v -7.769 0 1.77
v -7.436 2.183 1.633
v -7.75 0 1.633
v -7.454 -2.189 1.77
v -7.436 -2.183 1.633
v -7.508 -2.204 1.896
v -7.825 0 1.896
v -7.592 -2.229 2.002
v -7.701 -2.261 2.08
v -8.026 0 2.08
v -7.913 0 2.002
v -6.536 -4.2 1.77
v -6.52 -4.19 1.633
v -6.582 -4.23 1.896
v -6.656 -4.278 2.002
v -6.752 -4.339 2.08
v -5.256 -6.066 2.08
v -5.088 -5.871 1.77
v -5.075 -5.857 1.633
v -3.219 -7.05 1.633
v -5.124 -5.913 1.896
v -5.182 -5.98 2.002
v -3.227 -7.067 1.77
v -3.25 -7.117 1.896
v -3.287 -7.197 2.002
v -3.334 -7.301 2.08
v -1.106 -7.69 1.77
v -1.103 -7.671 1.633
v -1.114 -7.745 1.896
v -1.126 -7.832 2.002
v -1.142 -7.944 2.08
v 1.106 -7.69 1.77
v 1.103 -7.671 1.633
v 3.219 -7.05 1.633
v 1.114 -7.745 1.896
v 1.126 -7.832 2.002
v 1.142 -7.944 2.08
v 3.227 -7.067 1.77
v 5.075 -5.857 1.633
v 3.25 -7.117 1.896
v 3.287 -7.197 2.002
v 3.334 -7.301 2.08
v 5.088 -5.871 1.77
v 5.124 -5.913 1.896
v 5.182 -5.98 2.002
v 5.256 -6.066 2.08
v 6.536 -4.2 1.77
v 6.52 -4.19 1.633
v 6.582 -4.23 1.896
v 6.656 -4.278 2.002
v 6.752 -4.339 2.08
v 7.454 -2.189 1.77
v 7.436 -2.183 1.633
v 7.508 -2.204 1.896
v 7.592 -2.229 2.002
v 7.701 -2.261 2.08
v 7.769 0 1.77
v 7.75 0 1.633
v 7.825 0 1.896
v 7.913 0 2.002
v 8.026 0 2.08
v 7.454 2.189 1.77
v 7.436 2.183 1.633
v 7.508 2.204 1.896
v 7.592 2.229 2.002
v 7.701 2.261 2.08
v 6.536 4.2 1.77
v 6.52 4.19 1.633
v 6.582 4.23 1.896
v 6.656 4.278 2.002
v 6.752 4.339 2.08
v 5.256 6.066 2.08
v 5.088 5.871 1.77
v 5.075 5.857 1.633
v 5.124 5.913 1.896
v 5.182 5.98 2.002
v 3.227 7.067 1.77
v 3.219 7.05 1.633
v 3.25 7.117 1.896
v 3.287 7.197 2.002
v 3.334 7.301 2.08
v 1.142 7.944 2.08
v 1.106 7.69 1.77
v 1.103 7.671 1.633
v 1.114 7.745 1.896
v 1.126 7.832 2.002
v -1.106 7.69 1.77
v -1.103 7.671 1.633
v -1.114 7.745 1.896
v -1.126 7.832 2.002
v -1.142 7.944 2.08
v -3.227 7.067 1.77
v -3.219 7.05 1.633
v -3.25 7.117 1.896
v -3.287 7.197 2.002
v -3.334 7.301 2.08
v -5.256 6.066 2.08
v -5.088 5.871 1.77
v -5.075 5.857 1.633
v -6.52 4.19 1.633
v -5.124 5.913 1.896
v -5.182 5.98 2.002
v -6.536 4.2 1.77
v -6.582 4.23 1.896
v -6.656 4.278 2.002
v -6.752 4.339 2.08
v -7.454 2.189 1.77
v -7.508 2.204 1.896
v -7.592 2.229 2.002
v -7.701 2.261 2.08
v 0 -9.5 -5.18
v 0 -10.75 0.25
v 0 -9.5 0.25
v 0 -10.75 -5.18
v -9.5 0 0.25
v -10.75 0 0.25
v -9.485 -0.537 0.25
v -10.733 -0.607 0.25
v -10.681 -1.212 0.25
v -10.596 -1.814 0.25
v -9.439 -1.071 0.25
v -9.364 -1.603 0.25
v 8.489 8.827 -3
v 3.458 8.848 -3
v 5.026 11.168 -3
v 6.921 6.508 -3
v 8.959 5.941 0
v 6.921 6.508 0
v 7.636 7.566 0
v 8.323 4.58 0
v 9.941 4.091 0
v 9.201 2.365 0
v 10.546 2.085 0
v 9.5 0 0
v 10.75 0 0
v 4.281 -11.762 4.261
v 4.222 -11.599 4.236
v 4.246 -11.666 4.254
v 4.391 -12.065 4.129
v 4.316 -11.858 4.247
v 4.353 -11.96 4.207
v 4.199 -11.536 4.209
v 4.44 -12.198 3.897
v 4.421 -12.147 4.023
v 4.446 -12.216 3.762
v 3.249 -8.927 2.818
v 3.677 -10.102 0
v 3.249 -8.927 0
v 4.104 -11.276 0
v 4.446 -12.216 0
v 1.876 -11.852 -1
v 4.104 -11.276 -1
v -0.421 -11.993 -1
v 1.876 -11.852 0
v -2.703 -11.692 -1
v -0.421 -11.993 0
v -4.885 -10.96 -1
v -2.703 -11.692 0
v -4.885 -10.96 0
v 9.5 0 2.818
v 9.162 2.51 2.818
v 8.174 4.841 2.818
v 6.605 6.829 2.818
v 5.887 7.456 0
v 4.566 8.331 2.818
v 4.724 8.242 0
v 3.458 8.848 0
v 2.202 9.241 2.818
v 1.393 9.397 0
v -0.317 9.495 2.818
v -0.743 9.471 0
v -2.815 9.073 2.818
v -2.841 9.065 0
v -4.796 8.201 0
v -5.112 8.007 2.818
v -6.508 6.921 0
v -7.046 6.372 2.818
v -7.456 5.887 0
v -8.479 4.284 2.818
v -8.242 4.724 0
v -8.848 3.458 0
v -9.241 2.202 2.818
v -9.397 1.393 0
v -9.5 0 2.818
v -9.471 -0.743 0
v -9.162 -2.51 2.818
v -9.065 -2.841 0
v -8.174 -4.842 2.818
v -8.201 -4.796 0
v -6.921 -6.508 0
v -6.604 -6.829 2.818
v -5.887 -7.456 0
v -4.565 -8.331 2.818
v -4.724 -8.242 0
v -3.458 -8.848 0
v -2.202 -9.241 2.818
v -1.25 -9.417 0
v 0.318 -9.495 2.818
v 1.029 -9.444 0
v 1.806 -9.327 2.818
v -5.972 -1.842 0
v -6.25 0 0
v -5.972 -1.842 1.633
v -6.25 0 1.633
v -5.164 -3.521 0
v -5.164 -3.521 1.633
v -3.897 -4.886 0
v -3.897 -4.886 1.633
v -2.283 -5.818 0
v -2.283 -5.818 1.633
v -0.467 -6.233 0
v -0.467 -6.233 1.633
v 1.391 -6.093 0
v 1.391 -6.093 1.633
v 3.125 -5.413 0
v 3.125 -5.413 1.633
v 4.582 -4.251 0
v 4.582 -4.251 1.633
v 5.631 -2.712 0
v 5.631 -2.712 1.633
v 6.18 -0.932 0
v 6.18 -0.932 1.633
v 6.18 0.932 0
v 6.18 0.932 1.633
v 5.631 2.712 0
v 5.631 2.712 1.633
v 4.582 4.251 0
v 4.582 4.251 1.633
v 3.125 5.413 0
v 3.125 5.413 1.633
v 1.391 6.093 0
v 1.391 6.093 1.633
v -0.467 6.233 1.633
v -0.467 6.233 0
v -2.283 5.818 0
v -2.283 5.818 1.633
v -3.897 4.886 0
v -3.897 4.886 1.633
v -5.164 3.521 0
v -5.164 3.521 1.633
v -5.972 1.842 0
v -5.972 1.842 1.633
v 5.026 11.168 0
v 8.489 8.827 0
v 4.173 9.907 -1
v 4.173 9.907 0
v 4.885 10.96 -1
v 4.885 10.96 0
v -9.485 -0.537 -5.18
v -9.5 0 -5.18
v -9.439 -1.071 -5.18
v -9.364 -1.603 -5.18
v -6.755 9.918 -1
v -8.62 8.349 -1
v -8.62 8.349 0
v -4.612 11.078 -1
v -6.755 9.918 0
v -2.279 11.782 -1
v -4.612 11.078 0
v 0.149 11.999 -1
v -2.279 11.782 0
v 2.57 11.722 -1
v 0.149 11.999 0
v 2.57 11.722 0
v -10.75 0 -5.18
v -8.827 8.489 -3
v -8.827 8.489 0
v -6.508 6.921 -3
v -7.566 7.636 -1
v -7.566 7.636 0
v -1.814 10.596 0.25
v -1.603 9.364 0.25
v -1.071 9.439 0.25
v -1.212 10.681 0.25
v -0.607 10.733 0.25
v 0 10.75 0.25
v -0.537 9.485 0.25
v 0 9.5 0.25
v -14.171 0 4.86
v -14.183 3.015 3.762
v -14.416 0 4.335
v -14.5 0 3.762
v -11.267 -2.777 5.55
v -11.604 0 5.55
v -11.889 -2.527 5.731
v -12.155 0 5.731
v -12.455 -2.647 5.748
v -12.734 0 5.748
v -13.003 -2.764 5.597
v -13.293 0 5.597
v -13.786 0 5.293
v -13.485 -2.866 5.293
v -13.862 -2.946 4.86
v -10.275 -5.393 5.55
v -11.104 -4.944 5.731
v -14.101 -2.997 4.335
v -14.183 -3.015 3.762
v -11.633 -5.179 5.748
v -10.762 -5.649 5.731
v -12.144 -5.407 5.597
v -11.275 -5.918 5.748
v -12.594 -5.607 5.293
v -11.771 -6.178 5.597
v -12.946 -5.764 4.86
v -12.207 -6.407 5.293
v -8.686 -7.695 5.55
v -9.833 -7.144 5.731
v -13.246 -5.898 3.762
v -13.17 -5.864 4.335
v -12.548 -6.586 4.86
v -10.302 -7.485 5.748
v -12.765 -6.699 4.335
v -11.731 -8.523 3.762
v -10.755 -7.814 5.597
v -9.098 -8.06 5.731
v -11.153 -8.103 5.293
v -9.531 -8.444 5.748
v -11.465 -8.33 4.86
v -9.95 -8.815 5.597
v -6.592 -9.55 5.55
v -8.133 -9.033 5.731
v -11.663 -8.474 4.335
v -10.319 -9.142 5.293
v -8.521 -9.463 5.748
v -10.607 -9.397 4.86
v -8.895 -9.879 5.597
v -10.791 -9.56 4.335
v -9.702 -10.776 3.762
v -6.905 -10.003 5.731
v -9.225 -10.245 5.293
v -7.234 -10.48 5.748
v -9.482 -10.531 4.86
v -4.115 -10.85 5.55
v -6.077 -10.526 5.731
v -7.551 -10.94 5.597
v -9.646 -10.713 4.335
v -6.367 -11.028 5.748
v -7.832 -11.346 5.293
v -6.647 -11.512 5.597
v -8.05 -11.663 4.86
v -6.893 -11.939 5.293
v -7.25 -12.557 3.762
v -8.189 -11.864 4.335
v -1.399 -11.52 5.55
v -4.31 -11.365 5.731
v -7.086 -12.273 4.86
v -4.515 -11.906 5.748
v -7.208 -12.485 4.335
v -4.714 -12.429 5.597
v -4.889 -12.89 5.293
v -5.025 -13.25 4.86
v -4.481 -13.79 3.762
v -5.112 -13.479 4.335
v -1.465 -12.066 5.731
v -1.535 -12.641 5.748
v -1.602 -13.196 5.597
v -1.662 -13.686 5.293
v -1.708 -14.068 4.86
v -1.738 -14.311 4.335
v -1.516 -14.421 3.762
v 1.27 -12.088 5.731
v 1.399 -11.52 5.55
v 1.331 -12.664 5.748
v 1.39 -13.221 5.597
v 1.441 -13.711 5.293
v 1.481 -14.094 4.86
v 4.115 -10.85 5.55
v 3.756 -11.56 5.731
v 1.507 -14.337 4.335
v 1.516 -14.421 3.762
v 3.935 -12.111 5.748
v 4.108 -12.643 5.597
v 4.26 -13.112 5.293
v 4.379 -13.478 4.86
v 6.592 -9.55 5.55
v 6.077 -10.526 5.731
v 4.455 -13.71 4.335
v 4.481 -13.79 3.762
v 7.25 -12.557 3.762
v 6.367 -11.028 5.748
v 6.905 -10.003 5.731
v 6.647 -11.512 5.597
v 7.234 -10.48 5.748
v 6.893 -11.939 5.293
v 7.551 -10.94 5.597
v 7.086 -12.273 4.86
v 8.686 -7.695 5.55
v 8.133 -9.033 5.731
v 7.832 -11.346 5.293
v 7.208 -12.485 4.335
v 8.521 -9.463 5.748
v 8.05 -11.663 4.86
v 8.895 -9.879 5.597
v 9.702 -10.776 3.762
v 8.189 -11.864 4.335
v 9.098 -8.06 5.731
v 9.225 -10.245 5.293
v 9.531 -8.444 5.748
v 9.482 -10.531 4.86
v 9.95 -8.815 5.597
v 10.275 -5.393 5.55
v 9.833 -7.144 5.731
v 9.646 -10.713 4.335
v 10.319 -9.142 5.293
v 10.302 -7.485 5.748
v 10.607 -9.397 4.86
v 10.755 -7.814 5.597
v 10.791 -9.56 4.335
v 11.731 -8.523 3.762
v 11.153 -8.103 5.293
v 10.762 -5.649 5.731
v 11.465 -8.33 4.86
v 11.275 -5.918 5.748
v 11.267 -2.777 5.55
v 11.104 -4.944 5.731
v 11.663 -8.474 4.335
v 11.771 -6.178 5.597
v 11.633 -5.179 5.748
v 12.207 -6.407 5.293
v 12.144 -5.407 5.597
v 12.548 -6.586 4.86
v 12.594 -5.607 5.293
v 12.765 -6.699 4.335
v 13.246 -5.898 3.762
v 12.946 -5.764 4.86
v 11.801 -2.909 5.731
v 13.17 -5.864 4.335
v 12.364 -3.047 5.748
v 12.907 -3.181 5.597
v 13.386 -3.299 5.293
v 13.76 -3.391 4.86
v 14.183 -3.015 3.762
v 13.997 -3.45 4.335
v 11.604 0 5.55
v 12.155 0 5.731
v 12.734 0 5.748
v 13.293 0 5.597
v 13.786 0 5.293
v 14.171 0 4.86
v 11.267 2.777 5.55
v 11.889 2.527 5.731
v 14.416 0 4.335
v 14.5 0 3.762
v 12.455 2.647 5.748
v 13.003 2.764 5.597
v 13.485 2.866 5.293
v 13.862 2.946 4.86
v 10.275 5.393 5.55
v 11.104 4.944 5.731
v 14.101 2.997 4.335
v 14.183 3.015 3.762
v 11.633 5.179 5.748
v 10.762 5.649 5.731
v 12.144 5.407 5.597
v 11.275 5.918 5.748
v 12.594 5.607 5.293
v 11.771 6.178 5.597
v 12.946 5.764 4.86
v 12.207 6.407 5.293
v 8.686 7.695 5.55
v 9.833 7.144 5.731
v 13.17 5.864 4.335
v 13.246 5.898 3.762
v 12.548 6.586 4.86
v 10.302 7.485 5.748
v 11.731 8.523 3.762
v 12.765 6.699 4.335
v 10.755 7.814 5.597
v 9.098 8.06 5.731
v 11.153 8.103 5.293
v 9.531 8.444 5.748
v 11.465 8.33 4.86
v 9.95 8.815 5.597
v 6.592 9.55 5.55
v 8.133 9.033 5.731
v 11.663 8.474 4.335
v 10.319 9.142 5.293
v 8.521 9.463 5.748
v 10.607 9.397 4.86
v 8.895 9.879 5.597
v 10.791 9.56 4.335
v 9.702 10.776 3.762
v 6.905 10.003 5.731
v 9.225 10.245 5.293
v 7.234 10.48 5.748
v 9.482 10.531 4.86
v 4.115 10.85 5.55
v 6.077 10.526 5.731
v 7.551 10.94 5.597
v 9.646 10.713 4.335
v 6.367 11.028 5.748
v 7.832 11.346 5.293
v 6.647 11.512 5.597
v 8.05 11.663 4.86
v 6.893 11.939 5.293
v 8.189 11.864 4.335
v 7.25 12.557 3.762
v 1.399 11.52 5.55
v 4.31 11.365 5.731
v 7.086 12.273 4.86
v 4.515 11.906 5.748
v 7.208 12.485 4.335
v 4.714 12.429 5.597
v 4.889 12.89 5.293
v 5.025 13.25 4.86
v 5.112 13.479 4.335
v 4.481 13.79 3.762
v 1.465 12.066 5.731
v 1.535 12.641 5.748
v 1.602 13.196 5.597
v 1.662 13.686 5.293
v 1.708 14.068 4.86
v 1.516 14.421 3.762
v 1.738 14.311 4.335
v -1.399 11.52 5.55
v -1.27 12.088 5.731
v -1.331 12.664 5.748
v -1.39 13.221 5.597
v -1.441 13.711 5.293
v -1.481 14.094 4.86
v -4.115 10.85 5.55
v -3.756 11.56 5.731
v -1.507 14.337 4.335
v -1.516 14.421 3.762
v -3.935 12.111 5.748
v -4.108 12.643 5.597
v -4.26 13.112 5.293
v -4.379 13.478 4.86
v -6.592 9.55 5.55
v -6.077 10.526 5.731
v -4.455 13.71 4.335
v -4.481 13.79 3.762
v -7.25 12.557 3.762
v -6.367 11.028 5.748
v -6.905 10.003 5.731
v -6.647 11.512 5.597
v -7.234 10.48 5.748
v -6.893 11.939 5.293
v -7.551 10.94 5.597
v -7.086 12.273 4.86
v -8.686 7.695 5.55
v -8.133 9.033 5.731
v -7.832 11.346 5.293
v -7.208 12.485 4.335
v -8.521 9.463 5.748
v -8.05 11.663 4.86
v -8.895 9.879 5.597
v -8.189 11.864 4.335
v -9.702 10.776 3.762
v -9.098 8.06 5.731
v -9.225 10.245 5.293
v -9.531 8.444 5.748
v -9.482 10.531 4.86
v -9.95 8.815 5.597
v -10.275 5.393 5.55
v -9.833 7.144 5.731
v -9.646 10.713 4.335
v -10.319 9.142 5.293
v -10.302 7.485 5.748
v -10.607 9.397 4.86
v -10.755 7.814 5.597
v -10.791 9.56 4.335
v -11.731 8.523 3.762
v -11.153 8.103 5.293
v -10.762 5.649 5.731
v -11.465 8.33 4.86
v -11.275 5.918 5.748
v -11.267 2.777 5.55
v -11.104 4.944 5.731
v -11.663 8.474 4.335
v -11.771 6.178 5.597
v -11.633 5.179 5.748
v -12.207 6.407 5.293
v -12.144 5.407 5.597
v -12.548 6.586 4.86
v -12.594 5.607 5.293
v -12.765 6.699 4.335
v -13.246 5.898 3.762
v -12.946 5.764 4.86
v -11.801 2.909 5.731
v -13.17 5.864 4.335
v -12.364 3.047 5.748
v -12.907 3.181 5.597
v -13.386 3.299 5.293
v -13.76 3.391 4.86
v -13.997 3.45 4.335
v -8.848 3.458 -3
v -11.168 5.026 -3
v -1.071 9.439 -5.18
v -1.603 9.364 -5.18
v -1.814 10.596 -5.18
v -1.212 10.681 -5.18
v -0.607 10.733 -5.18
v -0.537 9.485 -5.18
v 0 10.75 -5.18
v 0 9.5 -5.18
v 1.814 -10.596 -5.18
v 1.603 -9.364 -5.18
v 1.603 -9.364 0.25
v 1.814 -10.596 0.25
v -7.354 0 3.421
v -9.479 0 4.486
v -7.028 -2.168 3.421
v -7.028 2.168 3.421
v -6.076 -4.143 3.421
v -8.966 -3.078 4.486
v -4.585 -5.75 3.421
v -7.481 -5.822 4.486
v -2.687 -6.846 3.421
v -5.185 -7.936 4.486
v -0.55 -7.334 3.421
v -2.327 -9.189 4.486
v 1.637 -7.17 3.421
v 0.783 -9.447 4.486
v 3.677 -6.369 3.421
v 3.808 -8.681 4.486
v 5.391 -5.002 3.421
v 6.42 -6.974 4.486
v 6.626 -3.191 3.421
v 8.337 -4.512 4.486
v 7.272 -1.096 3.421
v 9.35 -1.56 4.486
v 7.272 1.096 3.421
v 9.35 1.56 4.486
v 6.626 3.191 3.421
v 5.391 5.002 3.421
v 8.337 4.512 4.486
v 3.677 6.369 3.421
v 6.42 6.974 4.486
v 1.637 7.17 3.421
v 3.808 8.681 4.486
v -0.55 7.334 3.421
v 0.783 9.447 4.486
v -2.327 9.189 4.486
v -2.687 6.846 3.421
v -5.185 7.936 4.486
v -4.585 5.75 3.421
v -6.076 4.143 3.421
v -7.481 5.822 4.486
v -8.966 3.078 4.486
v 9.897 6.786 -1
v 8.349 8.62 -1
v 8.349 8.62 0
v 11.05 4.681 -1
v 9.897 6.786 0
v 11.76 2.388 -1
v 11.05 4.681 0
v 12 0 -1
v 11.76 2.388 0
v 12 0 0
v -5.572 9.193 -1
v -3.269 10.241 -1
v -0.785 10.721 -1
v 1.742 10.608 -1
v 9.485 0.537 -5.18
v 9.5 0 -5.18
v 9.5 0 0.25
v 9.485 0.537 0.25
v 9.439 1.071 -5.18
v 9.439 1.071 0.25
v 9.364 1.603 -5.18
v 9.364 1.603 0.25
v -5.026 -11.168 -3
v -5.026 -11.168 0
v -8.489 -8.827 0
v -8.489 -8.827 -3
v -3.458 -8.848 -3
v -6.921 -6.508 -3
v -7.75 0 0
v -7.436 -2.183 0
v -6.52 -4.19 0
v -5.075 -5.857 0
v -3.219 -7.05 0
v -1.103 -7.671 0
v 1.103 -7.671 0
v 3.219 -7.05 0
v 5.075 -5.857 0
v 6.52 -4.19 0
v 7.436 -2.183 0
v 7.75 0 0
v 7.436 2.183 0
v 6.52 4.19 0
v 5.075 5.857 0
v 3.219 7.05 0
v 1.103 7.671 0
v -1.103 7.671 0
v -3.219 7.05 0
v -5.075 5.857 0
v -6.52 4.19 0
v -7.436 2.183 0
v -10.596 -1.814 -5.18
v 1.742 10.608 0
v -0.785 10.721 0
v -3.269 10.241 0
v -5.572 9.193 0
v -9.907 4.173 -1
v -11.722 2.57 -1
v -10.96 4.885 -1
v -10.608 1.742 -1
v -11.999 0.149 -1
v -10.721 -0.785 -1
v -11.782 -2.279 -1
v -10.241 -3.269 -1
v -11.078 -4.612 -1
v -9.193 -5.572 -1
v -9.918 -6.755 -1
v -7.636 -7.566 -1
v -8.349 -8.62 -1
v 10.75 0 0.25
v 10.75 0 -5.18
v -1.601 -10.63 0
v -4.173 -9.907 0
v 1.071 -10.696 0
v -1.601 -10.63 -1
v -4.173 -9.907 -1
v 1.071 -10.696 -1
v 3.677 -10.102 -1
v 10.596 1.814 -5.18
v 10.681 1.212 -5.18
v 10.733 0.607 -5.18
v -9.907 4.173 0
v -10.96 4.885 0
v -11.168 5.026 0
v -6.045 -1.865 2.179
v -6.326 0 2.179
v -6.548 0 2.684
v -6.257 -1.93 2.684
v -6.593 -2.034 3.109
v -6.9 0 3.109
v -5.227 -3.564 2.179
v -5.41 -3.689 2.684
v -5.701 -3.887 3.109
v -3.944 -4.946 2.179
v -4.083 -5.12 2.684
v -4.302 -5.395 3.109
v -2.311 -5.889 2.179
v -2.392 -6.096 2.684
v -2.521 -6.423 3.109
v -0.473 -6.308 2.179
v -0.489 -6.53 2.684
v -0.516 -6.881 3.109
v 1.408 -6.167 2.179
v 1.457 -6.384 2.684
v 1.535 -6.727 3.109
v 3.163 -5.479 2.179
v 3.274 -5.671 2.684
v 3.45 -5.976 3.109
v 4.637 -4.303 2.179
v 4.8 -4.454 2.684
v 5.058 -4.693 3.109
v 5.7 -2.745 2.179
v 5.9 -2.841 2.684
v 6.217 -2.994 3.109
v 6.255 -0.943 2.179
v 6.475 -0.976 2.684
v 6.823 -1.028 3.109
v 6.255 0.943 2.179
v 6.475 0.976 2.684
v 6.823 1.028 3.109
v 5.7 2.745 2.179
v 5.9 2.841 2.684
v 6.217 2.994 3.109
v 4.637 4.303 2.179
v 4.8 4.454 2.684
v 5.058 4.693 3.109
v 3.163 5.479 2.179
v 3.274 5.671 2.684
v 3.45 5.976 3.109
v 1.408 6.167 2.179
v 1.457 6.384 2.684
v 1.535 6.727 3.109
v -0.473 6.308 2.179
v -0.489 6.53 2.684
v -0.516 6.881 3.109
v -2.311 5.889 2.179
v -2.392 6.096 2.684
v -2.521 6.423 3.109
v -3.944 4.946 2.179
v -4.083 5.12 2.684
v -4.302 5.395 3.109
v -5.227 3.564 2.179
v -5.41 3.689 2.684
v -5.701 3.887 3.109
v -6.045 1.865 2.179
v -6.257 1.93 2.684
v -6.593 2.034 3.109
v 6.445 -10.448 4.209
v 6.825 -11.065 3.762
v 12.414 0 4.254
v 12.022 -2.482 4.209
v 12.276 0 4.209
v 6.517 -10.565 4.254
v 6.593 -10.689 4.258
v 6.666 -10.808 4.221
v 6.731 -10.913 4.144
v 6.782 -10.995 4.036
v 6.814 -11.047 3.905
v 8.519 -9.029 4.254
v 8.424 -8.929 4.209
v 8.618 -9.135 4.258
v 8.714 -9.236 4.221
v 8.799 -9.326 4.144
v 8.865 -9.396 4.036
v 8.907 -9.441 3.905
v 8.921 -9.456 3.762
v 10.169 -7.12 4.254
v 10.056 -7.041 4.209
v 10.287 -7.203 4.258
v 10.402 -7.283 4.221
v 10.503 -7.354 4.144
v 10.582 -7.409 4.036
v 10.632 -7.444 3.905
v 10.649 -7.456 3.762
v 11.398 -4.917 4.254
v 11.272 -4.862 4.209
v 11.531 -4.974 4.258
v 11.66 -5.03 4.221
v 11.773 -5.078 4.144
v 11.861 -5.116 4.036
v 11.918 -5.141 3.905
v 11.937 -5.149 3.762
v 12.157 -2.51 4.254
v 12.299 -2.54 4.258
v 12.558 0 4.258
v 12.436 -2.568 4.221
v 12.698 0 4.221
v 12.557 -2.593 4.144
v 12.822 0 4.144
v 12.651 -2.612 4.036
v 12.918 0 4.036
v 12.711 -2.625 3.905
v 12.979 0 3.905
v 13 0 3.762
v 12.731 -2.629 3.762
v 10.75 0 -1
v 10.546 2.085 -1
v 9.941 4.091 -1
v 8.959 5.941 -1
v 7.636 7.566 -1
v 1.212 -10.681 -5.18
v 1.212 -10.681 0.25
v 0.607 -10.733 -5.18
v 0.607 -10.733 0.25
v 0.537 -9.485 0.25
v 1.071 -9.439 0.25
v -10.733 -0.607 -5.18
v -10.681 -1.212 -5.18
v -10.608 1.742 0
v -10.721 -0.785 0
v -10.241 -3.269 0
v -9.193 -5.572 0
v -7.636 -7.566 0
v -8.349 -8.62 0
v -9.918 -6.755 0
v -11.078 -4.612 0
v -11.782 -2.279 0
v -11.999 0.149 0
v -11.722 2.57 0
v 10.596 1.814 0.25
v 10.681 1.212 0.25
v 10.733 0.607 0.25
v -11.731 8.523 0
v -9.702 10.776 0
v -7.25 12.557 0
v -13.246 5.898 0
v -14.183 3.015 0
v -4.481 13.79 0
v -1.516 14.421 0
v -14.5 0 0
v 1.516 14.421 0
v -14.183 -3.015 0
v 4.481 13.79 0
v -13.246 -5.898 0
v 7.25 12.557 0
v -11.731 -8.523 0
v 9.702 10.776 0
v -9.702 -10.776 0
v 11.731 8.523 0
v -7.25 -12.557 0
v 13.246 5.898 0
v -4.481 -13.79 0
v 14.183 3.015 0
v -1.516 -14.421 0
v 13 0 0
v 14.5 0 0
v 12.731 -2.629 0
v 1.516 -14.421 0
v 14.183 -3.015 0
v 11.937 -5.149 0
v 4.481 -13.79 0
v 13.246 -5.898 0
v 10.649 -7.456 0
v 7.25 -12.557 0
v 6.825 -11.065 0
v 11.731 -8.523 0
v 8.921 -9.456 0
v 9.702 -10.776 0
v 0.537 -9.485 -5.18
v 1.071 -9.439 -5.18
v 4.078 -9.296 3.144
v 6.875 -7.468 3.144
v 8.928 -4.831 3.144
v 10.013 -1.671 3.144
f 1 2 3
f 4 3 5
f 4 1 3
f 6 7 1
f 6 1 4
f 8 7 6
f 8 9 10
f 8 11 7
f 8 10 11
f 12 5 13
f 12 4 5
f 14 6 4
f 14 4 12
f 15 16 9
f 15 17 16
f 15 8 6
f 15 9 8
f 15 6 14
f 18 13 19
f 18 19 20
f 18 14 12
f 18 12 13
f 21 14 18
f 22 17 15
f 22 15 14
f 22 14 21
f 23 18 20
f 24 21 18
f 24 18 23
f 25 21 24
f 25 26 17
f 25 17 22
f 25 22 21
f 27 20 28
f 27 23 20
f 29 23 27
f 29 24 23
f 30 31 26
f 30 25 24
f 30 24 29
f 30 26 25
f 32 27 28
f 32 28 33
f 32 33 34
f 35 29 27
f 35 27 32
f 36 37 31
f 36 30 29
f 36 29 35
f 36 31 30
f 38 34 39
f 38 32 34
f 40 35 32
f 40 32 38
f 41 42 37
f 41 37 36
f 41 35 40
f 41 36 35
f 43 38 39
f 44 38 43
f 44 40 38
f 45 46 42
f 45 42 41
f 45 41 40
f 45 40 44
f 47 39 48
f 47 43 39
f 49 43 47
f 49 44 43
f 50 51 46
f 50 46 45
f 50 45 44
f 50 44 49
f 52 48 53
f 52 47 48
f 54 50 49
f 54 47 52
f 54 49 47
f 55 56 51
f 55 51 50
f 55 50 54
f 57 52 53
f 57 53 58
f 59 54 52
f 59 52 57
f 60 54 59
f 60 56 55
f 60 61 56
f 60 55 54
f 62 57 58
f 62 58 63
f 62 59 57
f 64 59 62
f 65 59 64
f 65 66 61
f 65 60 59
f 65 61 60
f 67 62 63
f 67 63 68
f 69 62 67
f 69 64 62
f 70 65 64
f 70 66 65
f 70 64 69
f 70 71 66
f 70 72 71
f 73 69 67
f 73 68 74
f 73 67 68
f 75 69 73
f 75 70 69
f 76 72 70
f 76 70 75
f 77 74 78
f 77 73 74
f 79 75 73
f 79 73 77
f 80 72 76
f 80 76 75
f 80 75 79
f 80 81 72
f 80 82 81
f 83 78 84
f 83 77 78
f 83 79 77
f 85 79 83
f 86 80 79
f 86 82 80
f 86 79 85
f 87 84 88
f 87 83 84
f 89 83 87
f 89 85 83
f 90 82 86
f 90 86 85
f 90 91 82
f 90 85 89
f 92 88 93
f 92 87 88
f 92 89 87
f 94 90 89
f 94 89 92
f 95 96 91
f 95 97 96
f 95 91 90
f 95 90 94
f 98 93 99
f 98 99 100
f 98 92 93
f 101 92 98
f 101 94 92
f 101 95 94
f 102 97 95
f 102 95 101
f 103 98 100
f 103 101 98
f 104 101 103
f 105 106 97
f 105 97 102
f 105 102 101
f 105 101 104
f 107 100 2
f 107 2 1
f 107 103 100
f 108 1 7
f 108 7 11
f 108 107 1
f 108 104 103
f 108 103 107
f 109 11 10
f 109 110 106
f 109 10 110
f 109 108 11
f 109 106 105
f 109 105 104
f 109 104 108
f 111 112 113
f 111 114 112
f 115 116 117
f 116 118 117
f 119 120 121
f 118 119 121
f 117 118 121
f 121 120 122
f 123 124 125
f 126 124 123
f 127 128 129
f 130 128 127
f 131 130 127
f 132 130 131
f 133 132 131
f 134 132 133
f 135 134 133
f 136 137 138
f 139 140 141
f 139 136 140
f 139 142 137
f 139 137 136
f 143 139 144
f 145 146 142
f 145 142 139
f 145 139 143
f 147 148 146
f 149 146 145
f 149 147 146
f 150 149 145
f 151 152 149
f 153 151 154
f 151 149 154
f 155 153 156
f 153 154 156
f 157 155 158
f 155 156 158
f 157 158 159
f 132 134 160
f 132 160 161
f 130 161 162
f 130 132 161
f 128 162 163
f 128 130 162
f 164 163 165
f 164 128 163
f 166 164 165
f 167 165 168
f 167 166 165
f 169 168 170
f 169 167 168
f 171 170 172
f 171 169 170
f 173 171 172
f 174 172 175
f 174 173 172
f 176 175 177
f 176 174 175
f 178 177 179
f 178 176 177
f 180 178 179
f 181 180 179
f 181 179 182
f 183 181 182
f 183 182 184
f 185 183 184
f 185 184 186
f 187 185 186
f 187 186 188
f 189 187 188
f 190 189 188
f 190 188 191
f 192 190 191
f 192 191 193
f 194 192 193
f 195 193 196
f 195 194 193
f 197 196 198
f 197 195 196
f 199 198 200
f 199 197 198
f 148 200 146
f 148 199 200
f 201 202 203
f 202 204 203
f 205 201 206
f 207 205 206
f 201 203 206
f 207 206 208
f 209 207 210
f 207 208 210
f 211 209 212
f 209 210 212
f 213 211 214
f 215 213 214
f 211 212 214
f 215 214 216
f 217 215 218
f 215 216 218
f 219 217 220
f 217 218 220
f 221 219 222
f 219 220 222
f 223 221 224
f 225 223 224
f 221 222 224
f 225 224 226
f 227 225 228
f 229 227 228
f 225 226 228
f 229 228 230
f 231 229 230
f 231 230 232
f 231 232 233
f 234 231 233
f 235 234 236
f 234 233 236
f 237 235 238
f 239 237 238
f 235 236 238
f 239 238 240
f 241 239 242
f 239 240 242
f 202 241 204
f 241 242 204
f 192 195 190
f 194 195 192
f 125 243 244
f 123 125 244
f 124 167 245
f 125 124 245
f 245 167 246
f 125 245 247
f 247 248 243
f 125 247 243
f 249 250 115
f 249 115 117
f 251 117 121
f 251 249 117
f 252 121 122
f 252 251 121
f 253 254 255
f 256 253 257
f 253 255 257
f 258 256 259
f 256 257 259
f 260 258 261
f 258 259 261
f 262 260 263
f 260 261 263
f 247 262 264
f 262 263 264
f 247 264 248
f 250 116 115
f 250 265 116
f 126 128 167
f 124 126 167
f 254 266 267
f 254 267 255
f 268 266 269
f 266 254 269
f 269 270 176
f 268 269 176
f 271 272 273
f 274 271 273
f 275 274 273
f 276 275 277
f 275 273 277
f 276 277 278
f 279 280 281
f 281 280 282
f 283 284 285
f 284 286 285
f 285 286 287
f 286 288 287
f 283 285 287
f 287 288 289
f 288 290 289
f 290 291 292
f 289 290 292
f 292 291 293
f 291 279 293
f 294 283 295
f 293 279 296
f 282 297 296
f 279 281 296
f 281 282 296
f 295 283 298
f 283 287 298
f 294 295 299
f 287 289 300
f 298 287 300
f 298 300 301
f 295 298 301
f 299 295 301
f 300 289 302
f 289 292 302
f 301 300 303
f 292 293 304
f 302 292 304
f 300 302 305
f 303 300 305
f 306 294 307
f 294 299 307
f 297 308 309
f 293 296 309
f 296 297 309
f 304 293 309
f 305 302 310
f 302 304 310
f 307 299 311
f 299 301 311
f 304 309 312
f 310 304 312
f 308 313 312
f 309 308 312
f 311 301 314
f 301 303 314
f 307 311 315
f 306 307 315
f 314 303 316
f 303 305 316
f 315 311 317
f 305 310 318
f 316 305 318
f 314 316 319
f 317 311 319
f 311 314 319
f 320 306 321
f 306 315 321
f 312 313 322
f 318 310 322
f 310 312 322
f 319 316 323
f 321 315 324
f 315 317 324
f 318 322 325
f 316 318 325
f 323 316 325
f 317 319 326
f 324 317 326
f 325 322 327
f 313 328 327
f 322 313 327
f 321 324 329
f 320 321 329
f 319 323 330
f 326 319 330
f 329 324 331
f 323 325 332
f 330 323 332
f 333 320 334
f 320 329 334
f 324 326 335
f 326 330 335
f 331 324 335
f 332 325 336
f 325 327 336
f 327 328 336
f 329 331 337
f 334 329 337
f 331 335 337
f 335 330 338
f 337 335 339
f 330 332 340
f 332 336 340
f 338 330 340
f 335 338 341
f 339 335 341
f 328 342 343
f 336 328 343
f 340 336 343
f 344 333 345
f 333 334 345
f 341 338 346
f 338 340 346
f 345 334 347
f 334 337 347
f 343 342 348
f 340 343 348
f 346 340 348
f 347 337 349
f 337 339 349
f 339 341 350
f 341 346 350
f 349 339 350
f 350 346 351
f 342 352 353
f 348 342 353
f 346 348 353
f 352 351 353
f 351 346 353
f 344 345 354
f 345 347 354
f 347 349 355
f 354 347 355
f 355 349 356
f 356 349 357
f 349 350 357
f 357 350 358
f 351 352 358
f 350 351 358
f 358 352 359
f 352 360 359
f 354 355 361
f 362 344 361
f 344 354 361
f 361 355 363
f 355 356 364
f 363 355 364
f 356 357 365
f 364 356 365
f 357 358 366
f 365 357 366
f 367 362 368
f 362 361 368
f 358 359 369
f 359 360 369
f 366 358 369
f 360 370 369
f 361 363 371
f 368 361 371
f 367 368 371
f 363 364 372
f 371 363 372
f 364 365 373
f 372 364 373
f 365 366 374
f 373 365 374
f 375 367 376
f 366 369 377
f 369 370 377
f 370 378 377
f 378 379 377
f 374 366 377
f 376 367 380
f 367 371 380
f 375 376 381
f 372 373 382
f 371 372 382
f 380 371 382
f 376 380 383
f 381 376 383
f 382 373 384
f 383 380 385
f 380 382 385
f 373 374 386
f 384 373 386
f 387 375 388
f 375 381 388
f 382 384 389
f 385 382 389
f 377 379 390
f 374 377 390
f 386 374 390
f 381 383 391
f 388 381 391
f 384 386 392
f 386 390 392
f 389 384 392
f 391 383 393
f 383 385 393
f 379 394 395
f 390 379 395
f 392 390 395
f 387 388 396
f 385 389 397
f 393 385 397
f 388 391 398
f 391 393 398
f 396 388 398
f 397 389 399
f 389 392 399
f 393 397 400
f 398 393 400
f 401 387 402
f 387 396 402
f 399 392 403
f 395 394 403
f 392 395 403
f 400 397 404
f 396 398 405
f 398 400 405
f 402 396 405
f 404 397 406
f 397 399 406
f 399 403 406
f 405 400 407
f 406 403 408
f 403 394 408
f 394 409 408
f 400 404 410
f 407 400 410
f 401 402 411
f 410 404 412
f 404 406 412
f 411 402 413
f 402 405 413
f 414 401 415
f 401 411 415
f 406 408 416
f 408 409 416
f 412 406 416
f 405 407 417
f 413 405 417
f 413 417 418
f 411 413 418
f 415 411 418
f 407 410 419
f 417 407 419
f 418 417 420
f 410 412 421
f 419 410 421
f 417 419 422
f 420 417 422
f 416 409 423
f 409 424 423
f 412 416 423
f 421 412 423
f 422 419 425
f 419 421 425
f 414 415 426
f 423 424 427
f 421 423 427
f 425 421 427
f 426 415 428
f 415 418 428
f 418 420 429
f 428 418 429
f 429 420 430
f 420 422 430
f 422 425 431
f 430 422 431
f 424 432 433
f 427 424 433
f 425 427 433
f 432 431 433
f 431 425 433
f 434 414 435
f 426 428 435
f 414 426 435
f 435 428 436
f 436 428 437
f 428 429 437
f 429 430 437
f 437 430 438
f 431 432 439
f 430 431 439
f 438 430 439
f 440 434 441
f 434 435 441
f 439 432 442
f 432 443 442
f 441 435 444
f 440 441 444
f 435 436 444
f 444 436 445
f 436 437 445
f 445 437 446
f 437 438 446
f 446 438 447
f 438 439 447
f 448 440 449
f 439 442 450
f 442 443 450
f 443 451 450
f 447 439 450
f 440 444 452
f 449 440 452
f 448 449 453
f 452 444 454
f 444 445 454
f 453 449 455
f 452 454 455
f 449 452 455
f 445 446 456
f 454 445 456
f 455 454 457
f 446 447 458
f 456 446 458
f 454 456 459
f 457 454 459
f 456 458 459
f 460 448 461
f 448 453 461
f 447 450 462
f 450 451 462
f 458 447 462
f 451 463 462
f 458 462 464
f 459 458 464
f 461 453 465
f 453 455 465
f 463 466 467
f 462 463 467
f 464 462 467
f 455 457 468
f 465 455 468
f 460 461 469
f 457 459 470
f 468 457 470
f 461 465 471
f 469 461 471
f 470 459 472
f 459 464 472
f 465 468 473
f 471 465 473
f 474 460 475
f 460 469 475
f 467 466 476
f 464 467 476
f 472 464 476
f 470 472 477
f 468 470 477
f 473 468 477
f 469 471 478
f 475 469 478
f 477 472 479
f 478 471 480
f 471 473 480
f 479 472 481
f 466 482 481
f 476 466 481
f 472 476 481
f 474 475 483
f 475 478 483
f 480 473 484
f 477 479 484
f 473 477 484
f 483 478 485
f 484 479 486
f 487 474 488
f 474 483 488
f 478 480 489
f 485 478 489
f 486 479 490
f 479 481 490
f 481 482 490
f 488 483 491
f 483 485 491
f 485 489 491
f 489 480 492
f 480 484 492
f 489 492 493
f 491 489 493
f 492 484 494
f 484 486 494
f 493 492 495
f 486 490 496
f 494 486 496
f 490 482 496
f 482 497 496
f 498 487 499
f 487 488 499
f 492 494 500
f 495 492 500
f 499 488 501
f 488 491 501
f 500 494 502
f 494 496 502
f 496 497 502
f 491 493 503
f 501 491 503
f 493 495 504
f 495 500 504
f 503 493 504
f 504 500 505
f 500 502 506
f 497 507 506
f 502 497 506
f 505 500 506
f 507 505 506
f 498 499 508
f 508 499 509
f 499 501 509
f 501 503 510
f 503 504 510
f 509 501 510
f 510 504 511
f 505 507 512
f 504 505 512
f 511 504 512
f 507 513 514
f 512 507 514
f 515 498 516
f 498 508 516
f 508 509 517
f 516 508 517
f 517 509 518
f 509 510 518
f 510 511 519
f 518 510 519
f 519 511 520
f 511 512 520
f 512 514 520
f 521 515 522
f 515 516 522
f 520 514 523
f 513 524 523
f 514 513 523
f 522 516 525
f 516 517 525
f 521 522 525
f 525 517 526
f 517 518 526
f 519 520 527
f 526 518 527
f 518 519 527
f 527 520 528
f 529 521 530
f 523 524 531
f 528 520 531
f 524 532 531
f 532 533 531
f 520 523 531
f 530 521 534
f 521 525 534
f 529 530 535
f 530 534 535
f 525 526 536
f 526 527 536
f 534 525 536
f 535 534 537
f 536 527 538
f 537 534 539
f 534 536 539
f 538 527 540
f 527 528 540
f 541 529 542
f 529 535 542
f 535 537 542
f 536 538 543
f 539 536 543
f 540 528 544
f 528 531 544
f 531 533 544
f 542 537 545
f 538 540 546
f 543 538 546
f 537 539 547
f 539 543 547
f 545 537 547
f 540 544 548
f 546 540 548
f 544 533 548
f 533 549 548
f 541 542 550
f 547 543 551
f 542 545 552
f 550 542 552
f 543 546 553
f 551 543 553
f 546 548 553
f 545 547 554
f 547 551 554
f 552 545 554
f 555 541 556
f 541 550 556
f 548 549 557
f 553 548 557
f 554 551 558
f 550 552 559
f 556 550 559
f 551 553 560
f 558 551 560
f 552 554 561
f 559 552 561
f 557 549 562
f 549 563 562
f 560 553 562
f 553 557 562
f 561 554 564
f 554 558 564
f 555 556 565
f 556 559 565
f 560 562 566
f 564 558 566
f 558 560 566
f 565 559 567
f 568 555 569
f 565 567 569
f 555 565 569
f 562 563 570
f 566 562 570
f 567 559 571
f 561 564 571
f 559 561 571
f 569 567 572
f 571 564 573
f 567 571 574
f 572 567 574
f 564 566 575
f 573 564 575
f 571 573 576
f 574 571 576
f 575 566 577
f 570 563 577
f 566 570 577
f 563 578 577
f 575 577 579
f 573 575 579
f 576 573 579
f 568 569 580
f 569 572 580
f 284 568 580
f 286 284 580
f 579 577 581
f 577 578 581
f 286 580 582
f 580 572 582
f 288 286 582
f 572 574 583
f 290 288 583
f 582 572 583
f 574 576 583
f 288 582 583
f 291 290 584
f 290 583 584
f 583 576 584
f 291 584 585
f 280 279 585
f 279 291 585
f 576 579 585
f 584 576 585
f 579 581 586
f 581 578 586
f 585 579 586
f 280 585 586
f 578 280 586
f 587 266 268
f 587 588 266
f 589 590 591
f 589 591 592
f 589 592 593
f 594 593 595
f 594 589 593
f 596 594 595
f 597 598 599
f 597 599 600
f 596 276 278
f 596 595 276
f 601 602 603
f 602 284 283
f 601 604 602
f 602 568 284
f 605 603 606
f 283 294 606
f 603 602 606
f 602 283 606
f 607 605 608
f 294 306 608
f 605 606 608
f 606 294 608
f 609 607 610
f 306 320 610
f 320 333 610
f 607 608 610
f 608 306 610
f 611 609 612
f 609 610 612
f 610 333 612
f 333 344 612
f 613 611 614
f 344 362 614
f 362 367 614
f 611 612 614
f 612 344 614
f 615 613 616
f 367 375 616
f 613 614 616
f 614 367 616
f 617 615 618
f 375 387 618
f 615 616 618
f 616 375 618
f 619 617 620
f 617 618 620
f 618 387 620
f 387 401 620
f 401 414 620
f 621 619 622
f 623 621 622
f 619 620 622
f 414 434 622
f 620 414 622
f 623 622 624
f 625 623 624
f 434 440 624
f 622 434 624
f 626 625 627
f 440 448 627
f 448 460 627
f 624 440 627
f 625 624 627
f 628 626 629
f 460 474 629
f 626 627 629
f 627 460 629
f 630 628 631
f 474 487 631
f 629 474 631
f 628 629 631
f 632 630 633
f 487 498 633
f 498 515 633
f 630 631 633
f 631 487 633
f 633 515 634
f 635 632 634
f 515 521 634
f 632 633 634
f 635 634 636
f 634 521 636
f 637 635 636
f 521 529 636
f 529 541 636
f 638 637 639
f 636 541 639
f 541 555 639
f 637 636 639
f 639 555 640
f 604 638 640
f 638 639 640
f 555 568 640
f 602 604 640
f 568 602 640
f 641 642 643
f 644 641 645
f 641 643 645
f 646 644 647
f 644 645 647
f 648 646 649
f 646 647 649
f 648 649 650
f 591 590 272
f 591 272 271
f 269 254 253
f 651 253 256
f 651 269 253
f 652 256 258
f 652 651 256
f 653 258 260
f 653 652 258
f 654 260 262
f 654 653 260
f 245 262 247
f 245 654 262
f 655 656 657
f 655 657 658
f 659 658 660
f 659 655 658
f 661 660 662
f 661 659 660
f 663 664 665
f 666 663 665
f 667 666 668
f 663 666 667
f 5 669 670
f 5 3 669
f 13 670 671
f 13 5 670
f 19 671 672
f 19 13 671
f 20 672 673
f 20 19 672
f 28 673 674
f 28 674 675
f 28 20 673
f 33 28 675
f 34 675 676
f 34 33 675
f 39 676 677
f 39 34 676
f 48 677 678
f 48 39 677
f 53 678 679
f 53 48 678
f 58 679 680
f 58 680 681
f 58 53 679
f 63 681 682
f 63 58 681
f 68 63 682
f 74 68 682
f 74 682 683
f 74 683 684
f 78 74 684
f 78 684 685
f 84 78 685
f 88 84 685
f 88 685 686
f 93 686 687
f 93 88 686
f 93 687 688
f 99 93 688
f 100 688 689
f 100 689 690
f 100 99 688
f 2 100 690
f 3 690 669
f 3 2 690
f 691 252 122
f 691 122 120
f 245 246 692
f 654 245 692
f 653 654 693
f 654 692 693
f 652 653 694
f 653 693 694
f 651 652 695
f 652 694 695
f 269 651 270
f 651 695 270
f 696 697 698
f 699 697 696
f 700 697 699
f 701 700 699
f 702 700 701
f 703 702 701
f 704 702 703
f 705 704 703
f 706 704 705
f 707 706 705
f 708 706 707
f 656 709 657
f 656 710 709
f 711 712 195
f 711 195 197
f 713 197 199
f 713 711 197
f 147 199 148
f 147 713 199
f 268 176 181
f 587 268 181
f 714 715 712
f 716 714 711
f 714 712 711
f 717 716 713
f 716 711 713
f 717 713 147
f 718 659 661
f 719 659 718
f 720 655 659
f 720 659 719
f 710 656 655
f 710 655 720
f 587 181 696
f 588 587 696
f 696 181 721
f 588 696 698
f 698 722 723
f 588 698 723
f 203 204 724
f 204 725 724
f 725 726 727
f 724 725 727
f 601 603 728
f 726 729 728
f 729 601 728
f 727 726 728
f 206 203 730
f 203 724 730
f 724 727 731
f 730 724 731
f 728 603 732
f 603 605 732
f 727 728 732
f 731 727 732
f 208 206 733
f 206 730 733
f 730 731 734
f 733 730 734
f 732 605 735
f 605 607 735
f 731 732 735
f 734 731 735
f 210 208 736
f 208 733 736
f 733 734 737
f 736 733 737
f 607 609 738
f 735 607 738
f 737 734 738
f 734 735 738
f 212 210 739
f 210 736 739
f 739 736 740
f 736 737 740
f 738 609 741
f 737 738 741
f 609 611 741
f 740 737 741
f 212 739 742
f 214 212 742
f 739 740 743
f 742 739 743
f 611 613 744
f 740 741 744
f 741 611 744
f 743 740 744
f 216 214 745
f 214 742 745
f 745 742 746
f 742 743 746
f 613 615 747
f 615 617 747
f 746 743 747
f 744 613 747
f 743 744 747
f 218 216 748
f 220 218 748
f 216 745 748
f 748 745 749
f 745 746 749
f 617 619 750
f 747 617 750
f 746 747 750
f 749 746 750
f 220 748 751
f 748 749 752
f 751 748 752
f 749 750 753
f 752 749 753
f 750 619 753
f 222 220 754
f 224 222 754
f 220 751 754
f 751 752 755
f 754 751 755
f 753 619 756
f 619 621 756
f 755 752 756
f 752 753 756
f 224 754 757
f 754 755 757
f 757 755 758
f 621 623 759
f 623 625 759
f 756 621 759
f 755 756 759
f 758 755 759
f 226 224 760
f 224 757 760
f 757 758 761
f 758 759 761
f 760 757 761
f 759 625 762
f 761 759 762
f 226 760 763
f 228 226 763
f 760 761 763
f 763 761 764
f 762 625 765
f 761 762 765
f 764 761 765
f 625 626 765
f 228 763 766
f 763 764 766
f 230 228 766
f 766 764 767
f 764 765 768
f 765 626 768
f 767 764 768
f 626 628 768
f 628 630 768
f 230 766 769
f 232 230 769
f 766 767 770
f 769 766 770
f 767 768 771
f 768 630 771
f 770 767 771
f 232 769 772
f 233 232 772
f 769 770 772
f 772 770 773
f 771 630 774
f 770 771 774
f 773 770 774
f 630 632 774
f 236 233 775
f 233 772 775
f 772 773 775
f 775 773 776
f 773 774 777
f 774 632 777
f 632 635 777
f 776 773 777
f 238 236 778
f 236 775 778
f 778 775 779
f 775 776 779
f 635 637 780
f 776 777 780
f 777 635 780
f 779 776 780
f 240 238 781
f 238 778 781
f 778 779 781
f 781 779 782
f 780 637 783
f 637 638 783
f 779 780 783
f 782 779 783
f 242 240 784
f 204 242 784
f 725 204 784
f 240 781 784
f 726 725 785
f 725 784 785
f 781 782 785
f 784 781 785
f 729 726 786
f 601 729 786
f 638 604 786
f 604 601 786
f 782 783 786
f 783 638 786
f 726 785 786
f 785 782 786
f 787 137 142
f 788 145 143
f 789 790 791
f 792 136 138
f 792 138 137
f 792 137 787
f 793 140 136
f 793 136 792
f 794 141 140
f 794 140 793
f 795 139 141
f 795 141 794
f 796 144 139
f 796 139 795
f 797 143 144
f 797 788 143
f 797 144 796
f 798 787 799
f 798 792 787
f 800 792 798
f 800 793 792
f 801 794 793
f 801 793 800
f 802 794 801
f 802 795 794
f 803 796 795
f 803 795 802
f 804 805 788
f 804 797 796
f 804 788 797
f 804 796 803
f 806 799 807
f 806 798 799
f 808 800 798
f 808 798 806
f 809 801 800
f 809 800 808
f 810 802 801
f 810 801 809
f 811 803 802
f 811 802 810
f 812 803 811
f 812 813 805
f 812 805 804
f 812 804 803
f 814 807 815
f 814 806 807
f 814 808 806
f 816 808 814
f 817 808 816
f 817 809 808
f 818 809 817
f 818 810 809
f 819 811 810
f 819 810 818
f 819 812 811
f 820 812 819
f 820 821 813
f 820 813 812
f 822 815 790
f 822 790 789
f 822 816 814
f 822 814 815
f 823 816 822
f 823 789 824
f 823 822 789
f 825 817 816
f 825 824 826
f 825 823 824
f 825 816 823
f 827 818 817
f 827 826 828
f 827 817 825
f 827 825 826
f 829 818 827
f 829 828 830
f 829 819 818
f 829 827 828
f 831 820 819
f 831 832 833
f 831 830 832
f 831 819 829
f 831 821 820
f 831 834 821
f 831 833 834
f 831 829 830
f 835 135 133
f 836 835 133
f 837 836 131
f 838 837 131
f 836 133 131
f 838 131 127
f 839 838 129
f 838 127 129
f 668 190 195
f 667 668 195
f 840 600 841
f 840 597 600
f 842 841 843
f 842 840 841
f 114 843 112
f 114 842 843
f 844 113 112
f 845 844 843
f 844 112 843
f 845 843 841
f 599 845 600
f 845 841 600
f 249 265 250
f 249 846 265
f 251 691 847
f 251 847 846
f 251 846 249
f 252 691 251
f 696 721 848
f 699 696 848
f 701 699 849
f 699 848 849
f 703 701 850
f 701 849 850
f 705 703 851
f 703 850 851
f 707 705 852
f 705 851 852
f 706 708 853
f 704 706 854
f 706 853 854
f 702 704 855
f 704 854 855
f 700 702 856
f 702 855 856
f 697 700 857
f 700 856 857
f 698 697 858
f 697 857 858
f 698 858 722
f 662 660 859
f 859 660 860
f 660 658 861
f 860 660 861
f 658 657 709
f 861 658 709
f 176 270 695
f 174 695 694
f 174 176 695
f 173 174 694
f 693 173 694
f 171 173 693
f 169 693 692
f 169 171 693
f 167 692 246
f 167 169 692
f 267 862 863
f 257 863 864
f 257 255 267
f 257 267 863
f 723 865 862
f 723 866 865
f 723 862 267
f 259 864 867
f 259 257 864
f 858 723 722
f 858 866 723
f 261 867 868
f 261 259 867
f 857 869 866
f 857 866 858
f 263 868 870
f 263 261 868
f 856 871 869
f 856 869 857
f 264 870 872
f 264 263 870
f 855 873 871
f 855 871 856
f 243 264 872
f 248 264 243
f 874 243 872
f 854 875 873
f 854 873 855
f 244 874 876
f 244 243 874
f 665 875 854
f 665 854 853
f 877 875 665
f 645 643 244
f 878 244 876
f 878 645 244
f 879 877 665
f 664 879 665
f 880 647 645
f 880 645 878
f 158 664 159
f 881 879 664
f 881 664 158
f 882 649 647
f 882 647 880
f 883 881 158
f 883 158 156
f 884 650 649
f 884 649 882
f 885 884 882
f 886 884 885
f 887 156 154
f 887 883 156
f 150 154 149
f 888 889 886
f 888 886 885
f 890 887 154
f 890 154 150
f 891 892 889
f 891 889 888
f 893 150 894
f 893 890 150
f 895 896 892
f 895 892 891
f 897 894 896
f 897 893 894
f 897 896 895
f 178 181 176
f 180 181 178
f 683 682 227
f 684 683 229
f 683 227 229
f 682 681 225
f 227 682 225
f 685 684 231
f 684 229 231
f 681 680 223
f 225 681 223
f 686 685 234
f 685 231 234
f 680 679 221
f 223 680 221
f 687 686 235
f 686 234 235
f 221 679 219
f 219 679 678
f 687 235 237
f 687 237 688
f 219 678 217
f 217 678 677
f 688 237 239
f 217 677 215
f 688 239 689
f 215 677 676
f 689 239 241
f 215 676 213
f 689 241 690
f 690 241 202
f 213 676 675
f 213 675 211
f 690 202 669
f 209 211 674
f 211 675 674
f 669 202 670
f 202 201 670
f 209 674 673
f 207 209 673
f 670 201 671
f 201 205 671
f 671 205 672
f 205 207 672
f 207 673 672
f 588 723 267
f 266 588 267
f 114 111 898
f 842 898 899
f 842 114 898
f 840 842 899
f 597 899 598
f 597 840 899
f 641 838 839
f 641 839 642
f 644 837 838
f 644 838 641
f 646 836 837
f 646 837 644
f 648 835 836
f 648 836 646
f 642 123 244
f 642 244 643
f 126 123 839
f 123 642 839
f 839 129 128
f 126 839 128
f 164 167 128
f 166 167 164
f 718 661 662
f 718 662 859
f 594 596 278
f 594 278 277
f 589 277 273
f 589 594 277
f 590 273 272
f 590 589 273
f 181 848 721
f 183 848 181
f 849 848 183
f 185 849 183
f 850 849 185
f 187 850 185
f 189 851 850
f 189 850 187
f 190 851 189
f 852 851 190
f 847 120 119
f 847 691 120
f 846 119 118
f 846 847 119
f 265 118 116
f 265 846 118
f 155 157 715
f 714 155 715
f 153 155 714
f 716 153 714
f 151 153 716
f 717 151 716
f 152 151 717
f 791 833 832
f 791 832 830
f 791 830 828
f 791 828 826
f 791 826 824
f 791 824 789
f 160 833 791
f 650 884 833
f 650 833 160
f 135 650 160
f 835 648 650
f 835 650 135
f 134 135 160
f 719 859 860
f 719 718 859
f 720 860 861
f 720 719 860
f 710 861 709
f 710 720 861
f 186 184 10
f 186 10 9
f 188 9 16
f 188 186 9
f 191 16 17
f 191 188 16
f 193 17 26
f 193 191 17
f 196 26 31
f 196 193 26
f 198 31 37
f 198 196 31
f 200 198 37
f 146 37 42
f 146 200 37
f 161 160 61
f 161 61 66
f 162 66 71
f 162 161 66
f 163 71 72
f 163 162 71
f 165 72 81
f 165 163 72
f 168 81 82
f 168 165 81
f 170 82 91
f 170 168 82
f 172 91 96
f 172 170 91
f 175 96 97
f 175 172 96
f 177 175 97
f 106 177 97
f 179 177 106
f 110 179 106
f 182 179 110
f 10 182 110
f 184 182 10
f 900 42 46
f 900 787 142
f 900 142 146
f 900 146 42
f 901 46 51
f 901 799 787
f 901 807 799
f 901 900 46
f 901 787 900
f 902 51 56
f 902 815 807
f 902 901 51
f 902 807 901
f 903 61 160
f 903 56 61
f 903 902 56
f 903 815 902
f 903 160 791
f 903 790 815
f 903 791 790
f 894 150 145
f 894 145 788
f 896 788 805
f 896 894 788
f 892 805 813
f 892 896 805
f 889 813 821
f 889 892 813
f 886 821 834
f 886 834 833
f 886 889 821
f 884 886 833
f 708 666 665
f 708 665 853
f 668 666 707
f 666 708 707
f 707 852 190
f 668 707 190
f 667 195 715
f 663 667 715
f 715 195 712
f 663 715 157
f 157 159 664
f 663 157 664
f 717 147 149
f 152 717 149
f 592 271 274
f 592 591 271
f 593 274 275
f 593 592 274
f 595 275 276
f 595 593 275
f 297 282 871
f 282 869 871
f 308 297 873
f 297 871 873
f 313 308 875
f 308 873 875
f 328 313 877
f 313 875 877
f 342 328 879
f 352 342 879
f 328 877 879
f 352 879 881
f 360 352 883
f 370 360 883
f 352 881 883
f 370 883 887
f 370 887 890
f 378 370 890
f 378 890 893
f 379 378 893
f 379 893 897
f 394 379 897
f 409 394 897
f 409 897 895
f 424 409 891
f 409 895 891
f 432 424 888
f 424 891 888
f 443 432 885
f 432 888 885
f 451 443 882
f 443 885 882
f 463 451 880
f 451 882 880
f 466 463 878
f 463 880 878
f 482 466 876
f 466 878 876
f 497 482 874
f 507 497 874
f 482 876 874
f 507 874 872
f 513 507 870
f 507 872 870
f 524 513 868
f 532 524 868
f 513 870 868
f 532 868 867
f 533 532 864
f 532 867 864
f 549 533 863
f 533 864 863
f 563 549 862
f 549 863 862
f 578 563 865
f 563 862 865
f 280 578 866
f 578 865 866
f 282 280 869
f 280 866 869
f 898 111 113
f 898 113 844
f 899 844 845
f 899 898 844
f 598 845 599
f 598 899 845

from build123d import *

# Parameters (mm, degrees)
F2_T           = -1.5
F6_DEPTH       = 3
F8_DEPTH       = 1
F10_DEPTH      = 5.18
F10_DEPTH_BACK = 0.25


with BuildPart() as f1:
    # F0 (on Front) → F1 (revolve)
    with BuildSketch(Plane.XZ):
        with BuildLine():
            Line((-14.5, 0), (-6.25, 0))
            Line((-6.25, 0), (-6.25, 1.632991153))
            ThreePointArc((-6.25, 1.632991153), (-6.5483488901, 2.6838876751), (-7.3543835, 3.4212503862))
            Line((-7.3543835, 3.4212503862), (-11.6043835, 5.5497841325))
            ThreePointArc((-11.6043835, 5.5497841325), (-13.550896522, 5.4631760093), (-14.5, 3.7615248994))
            Line((-14.5, 3.7615248994), (-14.5, 0))
        make_face()
    revolve(axis=Axis((0, 0, 5.6854286231), (0, 0, 1)))

    # F2
    f2_openings = [f1.faces().sort_by_distance(p)[0] for p in [
        (14.089878, 0, 0),
    ]]
    offset(amount=F2_T, openings=f2_openings)

    # F3 (on face) → F4 (join, up to the next surface of F1)
    with BuildSketch(Plane(origin=(0, 0, 0), x_dir=(1, 0, 0), z_dir=(0, 0, -1))):
        with BuildLine():
            ThreePointArc((4.4462618632, 12.2160040702), (-10.6489765758, -7.4564936726), (13, 0))
            Line((13, 0), (9.5, 0))
            ThreePointArc((9.5, 0), (-7.7819444207, -5.4489761453), (3.2491913616, 8.9270798975))
            Line((3.2491913616, 8.9270798975), (4.4462618632, 12.2160040702))
        make_face()
    extrude(until=Until.NEXT, dir=(0, 0, 1))

    # F5 (on face) → F6 (join)
    with BuildSketch(Plane(origin=(0, 0, 0), x_dir=(1, 0, 0), z_dir=(0, 0, -1))):
        with BuildLine():
            Line((-8.4889969369, 8.8274302143), (-6.9210526316, 6.5076132699))
            ThreePointArc((-6.9210526316, 6.5076132699), (-5.3198110359, 7.8708074899), (-3.457897336, 8.8483301257))
            Line((-3.457897336, 8.8483301257), (-5.0258416413, 11.1681470701))
            Line((-5.0258416413, 11.1681470701), (-8.4889969369, 8.8274302143))
        make_face()
        with BuildLine():
            Line((-8.8274302143, -8.4889969369), (-6.5076132699, -6.9210526316))
            ThreePointArc((-6.5076132699, -6.9210526316), (-7.8708074899, -5.3198110359), (-8.8483301257, -3.457897336))
            Line((-8.8483301257, -3.457897336), (-11.1681470701, -5.0258416413))
            Line((-11.1681470701, -5.0258416413), (-8.8274302143, -8.4889969369))
        make_face()
        with BuildLine():
            Line((8.4889969369, -8.8274302143), (6.9210526316, -6.5076132699))
            ThreePointArc((6.9210526316, -6.5076132699), (5.3198110359, -7.8708074899), (3.457897336, -8.8483301257))
            Line((3.457897336, -8.8483301257), (5.0258416413, -11.1681470701))
            Line((5.0258416413, -11.1681470701), (8.4889969369, -8.8274302143))
        make_face()
        with BuildLine():
            ThreePointArc((3.457897336, -8.8483301257), (5.3198110359, -7.8708074899), (6.9210526316, -6.5076132699))
            Line((6.9210526316, -6.5076132699), (3.457897336, -8.8483301257))
        make_face()
        with BuildLine():
            ThreePointArc((-8.8483301257, -3.457897336), (-7.8708074899, -5.3198110359), (-6.5076132699, -6.9210526316))
            Line((-6.5076132699, -6.9210526316), (-8.8483301257, -3.457897336))
        make_face()
        with BuildLine():
            ThreePointArc((-3.457897336, 8.8483301257), (-5.3198110359, 7.8708074899), (-6.9210526316, 6.5076132699))
            Line((-6.9210526316, 6.5076132699), (-3.457897336, 8.8483301257))
        make_face()
    extrude(amount=F6_DEPTH)

    # F7 (on face) → F8 (join)
    with BuildSketch(Plane(origin=(0, 0, 0), x_dir=(1, 0, 0), z_dir=(0, 0, -1))):
        with BuildLine():
            Line((3.6767165408, 10.1016956734), (4.1042417199, 11.2763114494))
            ThreePointArc((4.1042417199, 11.2763114494), (-9.8298245315, -6.8829172362), (12, 0))
            Line((12, 0), (10.75, 0))
            ThreePointArc((10.75, 0), (-8.8058844761, -6.1659466908), (3.6767165408, 10.1016956734))
        make_face()
    extrude(amount=F8_DEPTH)


with BuildPart() as f10:
    # F9 (on face) → F10 (new body, two sides)
    with BuildSketch(Plane(origin=(0, 0, 0), x_dir=(1, 0, 0), z_dir=(0, 0, -1))) as f10_sk:
        with BuildLine():
            Line((0, 10.75), (0, 9.5))
            ThreePointArc((0, 9.5), (0.8042866653, 9.465892613), (1.6027981482, 9.36381536))
            Line((1.6027981482, 9.36381536), (1.8136926414, 10.5958963284))
            ThreePointArc((1.8136926414, 10.5958963284), (0.9101138581, 10.7114047989), (0, 10.75))
        make_face()
    extrude(amount=F10_DEPTH)
    extrude(f10_sk.sketch, amount=-F10_DEPTH_BACK)


with BuildPart() as f10b:
    # F9 (on face) → F10, piece 2 (new body, two sides)
    with BuildSketch(Plane(origin=(0, 0, 0), x_dir=(1, 0, 0), z_dir=(0, 0, -1))) as f10_2_sk:
        with BuildLine():
            Line((10.75, 0), (9.5, 0))
            ThreePointArc((9.5, 0), (9.465892613, -0.8042866653), (9.36381536, -1.6027981482))
            Line((9.36381536, -1.6027981482), (10.5958963284, -1.8136926414))
            ThreePointArc((10.5958963284, -1.8136926414), (10.7114047989, -0.9101138581), (10.75, 0))
        make_face()
    extrude(amount=F10_DEPTH)
    extrude(f10_2_sk.sketch, amount=-F10_DEPTH_BACK)


with BuildPart() as f10c:
    # F9 (on face) → F10, piece 3 (new body, two sides)
    with BuildSketch(Plane(origin=(0, 0, 0), x_dir=(1, 0, 0), z_dir=(0, 0, -1))) as f10_3_sk:
        with BuildLine():
            Line((0, -10.75), (0, -9.5))
            ThreePointArc((0, -9.5), (-0.8042866653, -9.465892613), (-1.6027981482, -9.36381536))
            Line((-1.6027981482, -9.36381536), (-1.8136926414, -10.5958963284))
            ThreePointArc((-1.8136926414, -10.5958963284), (-0.9101138581, -10.7114047989), (0, -10.75))
        make_face()
    extrude(amount=F10_DEPTH)
    extrude(f10_3_sk.sketch, amount=-F10_DEPTH_BACK)


with BuildPart() as f10d:
    # F9 (on face) → F10, piece 4 (new body, two sides)
    with BuildSketch(Plane(origin=(0, 0, 0), x_dir=(1, 0, 0), z_dir=(0, 0, -1))) as f10_4_sk:
        with BuildLine():
            Line((-10.75, 0), (-9.5, 0))
            ThreePointArc((-9.5, 0), (-9.465892613, 0.8042866653), (-9.36381536, 1.6027981482))
            Line((-9.36381536, 1.6027981482), (-10.5958963284, 1.8136926414))
            ThreePointArc((-10.5958963284, 1.8136926414), (-10.7114047989, 0.9101138581), (-10.75, 0))
        make_face()
    extrude(amount=F10_DEPTH)
    extrude(f10_4_sk.sketch, amount=-F10_DEPTH_BACK)


solid = Compound([f1.part, f10.part, f10b.part, f10c.part, f10d.part])
